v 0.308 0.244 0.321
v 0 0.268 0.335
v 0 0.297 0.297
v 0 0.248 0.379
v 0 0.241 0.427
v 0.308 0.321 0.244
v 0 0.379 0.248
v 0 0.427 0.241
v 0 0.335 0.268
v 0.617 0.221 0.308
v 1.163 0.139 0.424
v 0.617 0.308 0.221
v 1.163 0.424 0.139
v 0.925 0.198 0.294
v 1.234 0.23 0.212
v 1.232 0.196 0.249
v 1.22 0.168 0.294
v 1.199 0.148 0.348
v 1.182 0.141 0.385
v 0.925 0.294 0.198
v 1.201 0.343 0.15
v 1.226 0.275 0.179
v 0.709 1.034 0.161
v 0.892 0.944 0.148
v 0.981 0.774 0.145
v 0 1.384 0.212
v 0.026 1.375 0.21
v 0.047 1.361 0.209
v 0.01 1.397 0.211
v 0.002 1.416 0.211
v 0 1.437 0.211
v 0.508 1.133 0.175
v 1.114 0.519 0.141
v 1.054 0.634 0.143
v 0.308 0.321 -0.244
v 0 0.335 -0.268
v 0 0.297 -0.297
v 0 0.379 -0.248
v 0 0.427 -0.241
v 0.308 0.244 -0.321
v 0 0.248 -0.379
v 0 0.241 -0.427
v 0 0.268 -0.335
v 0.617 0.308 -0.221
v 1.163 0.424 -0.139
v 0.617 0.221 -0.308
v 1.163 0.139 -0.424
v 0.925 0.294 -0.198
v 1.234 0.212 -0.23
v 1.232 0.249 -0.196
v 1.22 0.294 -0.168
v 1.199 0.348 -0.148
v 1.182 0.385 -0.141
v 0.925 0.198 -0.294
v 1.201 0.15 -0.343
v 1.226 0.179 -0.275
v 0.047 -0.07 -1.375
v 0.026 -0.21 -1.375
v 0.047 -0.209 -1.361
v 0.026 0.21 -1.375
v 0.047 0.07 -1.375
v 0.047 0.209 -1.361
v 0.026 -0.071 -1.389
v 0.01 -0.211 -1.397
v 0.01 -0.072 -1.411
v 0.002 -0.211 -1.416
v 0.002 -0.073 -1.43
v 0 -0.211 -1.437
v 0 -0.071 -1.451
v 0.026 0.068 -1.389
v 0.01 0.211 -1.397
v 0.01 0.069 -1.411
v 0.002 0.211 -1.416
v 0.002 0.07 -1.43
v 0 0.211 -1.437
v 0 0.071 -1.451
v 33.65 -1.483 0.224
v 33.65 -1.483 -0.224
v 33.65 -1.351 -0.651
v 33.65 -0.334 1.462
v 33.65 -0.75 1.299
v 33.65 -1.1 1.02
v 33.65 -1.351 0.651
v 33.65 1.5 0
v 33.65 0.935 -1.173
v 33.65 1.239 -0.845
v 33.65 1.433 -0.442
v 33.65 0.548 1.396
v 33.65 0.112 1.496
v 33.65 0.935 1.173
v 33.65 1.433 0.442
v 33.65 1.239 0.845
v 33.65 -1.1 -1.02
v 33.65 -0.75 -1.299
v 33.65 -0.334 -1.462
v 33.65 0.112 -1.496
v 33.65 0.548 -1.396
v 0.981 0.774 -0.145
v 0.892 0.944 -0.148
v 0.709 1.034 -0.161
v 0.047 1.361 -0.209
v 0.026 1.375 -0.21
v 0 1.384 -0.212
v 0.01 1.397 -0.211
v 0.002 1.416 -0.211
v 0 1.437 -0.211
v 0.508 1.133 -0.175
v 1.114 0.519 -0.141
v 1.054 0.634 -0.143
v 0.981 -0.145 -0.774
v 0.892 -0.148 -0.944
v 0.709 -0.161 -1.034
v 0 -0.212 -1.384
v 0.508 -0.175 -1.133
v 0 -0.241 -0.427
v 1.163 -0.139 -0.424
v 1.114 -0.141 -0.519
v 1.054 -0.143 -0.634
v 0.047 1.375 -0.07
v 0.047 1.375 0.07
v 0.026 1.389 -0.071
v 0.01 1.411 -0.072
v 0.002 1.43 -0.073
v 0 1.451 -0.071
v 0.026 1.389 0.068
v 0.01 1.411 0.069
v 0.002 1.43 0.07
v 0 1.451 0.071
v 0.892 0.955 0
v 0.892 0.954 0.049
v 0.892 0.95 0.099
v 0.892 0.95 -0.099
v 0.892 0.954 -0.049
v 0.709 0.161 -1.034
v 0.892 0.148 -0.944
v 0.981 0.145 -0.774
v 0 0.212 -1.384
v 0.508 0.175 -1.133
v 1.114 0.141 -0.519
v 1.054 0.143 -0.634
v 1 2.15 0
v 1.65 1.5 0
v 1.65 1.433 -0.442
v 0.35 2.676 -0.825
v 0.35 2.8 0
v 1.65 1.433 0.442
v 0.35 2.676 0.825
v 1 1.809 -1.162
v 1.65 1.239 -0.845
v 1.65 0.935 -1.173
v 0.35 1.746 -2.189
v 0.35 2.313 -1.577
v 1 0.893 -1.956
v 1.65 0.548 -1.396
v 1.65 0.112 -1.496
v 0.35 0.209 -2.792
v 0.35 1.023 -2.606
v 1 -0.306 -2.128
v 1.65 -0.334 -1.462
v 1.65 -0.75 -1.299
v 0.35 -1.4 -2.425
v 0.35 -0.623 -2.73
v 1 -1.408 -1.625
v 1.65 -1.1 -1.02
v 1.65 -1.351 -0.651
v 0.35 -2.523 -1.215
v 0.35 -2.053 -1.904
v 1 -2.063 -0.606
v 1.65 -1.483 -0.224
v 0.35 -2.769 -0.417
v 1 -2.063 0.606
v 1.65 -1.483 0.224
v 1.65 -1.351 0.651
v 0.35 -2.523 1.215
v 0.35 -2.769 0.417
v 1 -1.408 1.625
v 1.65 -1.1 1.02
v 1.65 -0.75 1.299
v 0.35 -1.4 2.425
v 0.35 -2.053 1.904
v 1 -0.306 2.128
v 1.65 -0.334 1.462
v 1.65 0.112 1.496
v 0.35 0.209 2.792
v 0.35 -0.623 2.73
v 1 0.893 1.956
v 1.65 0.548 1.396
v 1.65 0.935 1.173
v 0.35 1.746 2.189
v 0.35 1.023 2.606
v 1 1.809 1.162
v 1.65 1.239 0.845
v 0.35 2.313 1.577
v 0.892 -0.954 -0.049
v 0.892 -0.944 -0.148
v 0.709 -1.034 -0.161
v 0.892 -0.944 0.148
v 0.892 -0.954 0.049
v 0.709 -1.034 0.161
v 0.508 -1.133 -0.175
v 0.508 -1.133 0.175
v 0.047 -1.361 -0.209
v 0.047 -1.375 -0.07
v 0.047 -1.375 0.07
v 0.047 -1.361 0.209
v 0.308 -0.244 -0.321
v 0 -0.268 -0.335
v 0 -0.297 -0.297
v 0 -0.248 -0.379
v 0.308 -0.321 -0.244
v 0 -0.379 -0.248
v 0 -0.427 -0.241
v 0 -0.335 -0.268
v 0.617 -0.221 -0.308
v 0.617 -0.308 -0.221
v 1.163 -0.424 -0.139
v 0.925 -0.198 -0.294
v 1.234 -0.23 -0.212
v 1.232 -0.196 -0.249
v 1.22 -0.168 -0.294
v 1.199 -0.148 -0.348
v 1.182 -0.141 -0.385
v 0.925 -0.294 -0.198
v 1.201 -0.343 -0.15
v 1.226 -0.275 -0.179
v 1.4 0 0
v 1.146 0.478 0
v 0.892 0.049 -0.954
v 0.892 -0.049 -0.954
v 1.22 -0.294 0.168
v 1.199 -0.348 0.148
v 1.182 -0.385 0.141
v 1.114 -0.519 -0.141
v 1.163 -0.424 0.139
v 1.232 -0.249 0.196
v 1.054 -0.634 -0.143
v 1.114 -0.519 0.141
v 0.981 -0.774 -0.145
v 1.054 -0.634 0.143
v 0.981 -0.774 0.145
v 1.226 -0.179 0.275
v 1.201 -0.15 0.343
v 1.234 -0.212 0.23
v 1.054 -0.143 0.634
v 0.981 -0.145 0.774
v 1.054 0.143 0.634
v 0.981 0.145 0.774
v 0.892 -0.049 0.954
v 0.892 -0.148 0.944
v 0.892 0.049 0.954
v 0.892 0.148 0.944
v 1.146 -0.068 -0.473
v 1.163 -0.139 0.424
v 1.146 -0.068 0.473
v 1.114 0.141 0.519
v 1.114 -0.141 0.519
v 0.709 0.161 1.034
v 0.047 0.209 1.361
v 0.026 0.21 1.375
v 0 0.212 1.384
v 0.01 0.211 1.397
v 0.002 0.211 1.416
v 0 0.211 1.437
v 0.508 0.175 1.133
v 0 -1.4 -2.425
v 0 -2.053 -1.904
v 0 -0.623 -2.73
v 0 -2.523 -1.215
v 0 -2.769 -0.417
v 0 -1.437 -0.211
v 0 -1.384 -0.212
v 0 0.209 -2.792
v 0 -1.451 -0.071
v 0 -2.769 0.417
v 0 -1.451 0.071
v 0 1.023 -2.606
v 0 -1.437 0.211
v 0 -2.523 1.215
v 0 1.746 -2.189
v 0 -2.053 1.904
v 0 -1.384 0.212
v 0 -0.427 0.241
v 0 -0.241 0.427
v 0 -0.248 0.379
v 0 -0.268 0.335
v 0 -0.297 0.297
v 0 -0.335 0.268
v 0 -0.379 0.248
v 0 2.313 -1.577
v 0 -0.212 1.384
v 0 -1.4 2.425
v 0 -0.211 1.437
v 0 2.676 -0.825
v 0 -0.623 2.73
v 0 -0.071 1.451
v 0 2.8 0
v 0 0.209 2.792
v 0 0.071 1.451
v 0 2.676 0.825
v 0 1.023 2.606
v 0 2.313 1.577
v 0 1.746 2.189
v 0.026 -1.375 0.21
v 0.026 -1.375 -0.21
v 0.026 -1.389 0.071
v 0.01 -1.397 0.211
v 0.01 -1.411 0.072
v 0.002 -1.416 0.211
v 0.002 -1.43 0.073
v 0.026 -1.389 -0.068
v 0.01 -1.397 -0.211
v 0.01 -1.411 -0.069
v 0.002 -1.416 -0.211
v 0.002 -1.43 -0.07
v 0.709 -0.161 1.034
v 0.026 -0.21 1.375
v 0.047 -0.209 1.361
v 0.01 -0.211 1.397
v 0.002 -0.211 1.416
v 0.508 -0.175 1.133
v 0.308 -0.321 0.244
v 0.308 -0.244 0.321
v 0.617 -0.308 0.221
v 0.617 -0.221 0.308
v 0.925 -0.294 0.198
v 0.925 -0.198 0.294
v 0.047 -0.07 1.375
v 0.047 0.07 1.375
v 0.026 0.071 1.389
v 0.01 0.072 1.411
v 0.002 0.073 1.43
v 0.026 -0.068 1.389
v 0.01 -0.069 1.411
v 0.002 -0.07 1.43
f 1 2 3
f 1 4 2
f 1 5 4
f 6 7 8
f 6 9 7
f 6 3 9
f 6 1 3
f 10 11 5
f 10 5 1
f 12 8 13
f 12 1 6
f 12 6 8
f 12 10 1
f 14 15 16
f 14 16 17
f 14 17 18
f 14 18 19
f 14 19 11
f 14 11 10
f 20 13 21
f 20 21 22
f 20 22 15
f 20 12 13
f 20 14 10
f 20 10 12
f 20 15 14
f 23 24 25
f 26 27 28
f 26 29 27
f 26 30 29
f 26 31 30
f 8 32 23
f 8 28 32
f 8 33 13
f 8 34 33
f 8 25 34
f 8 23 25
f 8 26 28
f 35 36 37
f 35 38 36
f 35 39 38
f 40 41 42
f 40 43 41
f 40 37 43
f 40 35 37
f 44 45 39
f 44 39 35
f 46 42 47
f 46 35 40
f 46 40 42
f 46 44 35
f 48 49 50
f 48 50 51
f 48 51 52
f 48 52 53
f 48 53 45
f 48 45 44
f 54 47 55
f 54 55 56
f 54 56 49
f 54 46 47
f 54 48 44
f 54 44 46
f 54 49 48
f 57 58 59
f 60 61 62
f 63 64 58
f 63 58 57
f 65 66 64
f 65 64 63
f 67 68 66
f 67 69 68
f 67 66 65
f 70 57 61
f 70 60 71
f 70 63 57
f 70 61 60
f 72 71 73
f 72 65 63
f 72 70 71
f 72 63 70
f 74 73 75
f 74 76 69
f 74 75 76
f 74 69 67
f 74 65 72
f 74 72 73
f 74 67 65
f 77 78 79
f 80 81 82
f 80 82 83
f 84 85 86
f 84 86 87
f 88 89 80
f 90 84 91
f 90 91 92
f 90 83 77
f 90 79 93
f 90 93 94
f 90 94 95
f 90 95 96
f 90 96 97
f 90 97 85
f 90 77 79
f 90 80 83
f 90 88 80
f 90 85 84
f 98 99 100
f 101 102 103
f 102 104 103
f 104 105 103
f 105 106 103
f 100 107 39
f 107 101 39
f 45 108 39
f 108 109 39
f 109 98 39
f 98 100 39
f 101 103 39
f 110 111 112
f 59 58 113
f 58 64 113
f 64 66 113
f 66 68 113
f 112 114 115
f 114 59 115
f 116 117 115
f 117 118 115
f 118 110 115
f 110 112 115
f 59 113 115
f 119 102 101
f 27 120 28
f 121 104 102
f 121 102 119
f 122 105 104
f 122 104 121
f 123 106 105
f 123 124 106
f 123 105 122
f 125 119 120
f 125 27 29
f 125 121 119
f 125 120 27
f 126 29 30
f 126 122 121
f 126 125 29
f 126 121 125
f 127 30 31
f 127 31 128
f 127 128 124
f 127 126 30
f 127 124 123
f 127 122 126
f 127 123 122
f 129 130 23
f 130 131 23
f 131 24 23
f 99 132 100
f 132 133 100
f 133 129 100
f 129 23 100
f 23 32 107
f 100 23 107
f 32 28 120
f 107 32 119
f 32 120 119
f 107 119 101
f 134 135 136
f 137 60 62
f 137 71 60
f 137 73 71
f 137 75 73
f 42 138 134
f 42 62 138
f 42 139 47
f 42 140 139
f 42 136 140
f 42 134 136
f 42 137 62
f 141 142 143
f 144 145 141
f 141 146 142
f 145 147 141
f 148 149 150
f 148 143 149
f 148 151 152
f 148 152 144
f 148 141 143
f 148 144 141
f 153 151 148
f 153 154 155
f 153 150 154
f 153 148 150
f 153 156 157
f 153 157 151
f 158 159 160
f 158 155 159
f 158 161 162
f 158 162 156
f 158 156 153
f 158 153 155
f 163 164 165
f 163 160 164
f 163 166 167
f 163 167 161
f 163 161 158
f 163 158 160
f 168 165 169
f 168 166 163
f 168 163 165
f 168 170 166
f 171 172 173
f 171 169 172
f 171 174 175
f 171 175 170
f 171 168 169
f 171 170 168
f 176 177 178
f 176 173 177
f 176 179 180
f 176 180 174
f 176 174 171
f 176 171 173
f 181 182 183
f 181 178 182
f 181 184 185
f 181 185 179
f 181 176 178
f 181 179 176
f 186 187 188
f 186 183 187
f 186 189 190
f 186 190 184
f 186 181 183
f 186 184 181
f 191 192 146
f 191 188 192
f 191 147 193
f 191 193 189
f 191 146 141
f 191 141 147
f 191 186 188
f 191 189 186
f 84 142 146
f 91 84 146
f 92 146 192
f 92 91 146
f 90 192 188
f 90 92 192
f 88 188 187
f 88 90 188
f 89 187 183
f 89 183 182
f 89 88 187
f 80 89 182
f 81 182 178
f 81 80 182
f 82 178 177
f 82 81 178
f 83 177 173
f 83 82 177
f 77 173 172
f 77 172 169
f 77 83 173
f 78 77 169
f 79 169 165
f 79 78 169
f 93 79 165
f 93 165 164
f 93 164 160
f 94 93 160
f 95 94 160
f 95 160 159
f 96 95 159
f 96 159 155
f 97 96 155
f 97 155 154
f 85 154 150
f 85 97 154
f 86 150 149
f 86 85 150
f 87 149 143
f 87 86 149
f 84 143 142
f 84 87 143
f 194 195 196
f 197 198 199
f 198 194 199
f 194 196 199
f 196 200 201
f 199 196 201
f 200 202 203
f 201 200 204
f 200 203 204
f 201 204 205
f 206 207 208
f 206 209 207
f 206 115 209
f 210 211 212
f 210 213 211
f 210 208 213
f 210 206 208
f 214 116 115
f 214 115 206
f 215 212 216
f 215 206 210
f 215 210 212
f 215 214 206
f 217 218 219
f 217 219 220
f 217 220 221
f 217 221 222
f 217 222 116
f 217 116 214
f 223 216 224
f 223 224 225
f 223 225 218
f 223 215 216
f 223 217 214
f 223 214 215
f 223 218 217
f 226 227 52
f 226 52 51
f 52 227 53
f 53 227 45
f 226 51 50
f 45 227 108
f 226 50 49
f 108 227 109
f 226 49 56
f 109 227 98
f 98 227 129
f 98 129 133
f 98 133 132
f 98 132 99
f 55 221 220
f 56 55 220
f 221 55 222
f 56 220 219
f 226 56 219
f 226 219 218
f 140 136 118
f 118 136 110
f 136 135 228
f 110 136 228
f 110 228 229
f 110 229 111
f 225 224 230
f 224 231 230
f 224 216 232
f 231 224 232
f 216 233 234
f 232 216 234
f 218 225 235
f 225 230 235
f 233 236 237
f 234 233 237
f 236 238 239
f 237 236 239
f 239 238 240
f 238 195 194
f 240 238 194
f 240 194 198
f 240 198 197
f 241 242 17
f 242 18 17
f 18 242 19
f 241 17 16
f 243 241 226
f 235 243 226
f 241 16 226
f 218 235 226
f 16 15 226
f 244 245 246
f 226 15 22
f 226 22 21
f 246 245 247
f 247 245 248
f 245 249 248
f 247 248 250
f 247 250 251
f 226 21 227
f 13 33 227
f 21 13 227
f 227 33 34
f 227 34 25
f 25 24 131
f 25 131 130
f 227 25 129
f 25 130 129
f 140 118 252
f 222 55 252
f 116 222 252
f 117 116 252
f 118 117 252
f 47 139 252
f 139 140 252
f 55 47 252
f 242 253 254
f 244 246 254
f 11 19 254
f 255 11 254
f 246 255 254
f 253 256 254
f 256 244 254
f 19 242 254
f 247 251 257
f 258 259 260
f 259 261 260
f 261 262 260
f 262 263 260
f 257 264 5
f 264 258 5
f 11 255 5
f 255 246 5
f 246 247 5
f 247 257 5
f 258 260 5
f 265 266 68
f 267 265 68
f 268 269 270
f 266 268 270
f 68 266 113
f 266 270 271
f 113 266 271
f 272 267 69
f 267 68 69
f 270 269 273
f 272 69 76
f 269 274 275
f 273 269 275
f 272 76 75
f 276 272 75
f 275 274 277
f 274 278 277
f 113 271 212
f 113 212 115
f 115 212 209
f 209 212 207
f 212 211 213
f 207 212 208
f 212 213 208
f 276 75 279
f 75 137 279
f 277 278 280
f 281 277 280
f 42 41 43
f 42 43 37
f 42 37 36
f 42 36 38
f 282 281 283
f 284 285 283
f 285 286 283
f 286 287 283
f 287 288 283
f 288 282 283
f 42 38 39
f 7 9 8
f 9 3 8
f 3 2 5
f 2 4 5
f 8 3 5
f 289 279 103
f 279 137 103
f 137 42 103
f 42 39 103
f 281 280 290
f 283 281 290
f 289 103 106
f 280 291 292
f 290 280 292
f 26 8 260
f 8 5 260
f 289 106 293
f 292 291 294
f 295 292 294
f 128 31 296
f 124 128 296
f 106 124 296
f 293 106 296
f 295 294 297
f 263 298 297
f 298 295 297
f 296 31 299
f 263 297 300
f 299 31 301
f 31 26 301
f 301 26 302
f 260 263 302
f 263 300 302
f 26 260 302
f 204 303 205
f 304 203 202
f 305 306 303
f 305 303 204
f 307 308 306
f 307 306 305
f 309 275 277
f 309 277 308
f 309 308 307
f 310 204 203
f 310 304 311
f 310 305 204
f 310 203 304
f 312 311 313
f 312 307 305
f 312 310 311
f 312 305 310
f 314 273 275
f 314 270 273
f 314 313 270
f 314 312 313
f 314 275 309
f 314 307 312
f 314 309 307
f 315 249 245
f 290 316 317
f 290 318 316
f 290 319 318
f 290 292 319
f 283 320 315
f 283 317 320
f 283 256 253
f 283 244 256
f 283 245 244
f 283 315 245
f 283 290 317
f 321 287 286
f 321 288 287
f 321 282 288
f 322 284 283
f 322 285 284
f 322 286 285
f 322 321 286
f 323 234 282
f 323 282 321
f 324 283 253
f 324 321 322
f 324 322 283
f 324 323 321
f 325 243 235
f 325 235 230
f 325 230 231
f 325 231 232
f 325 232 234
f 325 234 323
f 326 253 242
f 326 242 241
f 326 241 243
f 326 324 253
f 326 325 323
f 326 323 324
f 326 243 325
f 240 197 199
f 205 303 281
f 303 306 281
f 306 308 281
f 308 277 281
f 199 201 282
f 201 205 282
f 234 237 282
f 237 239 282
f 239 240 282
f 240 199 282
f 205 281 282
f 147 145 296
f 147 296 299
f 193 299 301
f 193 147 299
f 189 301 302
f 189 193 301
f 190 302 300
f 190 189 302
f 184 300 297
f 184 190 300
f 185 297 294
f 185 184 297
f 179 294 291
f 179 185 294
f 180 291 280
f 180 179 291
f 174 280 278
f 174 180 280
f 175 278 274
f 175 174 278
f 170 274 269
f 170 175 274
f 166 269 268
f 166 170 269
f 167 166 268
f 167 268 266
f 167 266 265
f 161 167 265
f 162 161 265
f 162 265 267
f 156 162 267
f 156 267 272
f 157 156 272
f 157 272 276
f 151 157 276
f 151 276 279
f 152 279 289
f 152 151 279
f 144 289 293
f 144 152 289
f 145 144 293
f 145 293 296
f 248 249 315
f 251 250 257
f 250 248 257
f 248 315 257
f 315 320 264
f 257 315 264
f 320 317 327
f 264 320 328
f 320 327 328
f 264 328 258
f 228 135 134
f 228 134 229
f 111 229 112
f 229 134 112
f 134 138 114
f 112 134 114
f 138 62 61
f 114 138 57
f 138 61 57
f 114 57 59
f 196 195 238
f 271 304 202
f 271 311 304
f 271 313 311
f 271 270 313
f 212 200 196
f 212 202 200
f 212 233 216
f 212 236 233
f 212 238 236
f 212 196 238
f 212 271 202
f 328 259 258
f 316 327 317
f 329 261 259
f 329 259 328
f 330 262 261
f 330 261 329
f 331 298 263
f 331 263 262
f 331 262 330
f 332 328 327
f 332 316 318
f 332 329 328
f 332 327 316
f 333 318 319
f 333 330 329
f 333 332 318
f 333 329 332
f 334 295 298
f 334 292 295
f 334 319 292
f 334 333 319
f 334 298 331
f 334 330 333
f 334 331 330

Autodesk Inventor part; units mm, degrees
ref_plane "YZ Plane" through (0, 0, 0) normal (1, 0, 0) x (0, 1, 0)
ref_plane "XZ Plane" through (0, 0, 0) normal (0, 1, 0) x (-1, 0, 0)
sketch "Эскиз1" plane through (0, 0, 0) normal (0, 0, 1) x (1, 0, 0)
  line L0 (1.4, 0) -> (30, 0)
  line L1 (11, 1.5) -> (10.6933, 1.5)
  line L2 (0, 2.8) -> (0, 1.4)
  line L3 (0, 1.4) -> (0.8921, 0.9552)
  line L4 (0.8921, 0.9552) -> (1.4, 0)
  line L5 (-6.73, 0) -> (40.38, 0) projected
  line L6 (0, -0.56) -> (0, 3.36) projected
  line L7 (0, 2.8) -> (0.35, 2.8)
  line L8 (0.35, 2.8) -> (1.65, 1.5)
  line L9 (11, 1.5) -> (1.65, 1.5) construction
  line L10 (1.65, 1.5) -> (33.65, 1.5)
  line L11 (33.65, 1.5) -> (33.65, 0)
  line L12 (33.65, 0) -> (30, 0)
  dimension "d4" = 2.8
  dimension "d5" = 26.5
  dimension "d6" = 62
  dimension "d7" = 1.4
  dimension "d8" = 0.3067
  dimension "d12" = 5.6
  dimension "d13" = 45
  dimension "d24" = 1.65
  dimension "d96" = 32
revolve "Базовый элемент" add sketch "Эскиз1" angle 360 about axis through (1.4, 0, 0) along (1, 0, 0) contours L4 L3 L2 L7 L8 L10 L1 L11 L5 L0
sketch "Эскиз2" plane through (0, 0, 0) normal (-1, 0, 0) x (0, 0, 1)
  line L0 (0, 1.4) -> (0, 0) construction
  line L1 (0, 0) -> (1.4, 0) construction
  arc A0 (0.42, 0) -> (0, 0.42) centre (0, 0) ccw construction
  arc A1 (0.49, 0) -> (0, 0.49) centre (0, 0) ccw construction
  arc A2 (1.3838, 0.2125) -> (0.2125, 1.3838) centre (0, 0) ccw
  line L2 (0, 0) -> (0.9899, 0.9899) construction
  line L3 (0.2125, 1.3838) -> (0.241, 0.4266)
  line L4 (1.3838, 0.2125) -> (0.4266, 0.241)
  arc A3 (0.2125, 1.3838) -> (0, 1.4) centre (0, 0) ccw
  arc A4 (1.4, 0) -> (1.3838, 0.2125) centre (0, 0) ccw
  line L5 (0, -3.92) -> (0, 3.92) projected
  line L6 (-3.92, 0) -> (3.92, 0) projected
  arc A5 (0.2125, -1.3838) -> (1.3838, -0.2125) centre (0, 0) ccw
  line L7 (0.2125, -1.3838) -> (0.241, -0.4266)
  line L8 (1.3838, -0.2125) -> (0.4266, -0.241)
  arc A6 (0, -1.4) -> (0.2125, -1.3838) centre (0, 0) ccw
  arc A7 (1.3838, -0.2125) -> (1.4, 0) centre (0, 0) ccw
  arc A8 (-0.2125, 1.3838) -> (-1.3838, 0.2125) centre (0, 0) ccw
  line L9 (-0.2125, 1.3838) -> (-0.241, 0.4266)
  line L10 (-1.3838, 0.2125) -> (-0.4266, 0.241)
  arc A9 (0, 1.4) -> (-0.2125, 1.3838) centre (0, 0) ccw
  arc A10 (-1.3838, 0.2125) -> (-1.4, 0) centre (0, 0) ccw
  arc A11 (-0.2125, -1.3838) -> (0, -1.4) centre (0, 0) ccw
  arc A12 (-1.3838, -0.2125) -> (-0.2125, -1.3838) centre (0, 0) ccw
  arc A13 (-1.4, 0) -> (-1.3838, -0.2125) centre (0, 0) ccw
  line L11 (-1.3838, -0.2125) -> (-0.4266, -0.241)
  line L12 (-0.2125, -1.3838) -> (-0.241, -0.4266)
  arc A14 (0.241, 0.4266) -> (0.4266, 0.241) centre (0.4323, 0.4323) ccw
  arc A15 (0.4266, -0.241) -> (0.241, -0.4266) centre (0.4323, -0.4323) ccw
  arc A16 (-0.4266, 0.241) -> (-0.241, 0.4266) centre (-0.4323, 0.4323) ccw
  arc A17 (-0.241, -0.4266) -> (-0.4266, -0.241) centre (-0.4323, -0.4323) ccw
  point P0 (0.9899, -0.9899)
  point P1 (-0.9899, 0.9899)
  point P2 (-0.9899, -0.9899)
  dimension "d17" = 0.84
  dimension "d18" = 0.98
  dimension "d19" = 2.8
  dimension "d20" = 45
  dimension "d21" = 0.2125
extrude "Паз" add sketch "Эскиз2" against normal up to next draft 5 contours L4 A14 L3 A2 | A5 L7 A15 L8 | L9 A16 L10 A8 | A12 L11 A17 L12
fillet "Сопряжение1" radius 0.085 4 edges at (0, 1.4, 0) (0, 0, -1.4) (0, -1.4, 0) (0, 0, 1.4)
thread "Резьба" size "M3x0.5" class "6g" standard "ISO Metric profile" length 32
ref_plane "Work Plane2" through (3.35, 0, 0) normal (0, 0, -1) x (1, 0, 0)
equation "\"d17\" = 0.3 * SDM"
equation "\"d18\" = 0.35 * SDM"
equation "\"d19\" = SDM"
equation "\"d21\" = 0.5 * SBR"
equation "\"d4\" = SDM"
equation "\"d7\" = INTI"
equation "\"d8\" = GAL"
equation "\"d12\" = KOD"
equation "\"d13\" = 0.5 * SEWI"
equation "\"d24\" = KOH"
equation "\"d23\" = 0.2 * SBR"
equation "\"d10\" = d96"
equation "\"GEL\" = 19"
equation "\"GAL\" = 0.61345 * PTC"
equation "\"SPD\" = NND - 1.2269 * PTC"
equation "\"KOD\" = 5.6"
equation "\"KOH\" = 1.65"
equation "\"SBR\" = 0.425"
equation "\"INTI\" = 1.4"
equation "\"SDM\" = 2.8"
equation "\"GD\" = NND"
equation "\"BDM\" = NND"
equation "\"SEWI\" = 90deg"
equation "\"d9\" = SDM"
equation "\"GUL\" = 0.61345 * PTC"
equation "\"TOA\" = 30deg"
equation "\"EPV\" = 3.15"
equation "\"THREADDIA\" = 3"
equation "\"FAWI\" = 45deg"
equation "\"RR\" = 0.1 * NND"
equation "\"PTC\" = 0.5"
equation "\"NND\" = 3"
equation "\"GD1\" = THREADDIA - 1.2269 * PTC"
properties part number "Винт 2.M3-6gx30 ГОСТ 17475-80" material "Сталь, мягкая"
